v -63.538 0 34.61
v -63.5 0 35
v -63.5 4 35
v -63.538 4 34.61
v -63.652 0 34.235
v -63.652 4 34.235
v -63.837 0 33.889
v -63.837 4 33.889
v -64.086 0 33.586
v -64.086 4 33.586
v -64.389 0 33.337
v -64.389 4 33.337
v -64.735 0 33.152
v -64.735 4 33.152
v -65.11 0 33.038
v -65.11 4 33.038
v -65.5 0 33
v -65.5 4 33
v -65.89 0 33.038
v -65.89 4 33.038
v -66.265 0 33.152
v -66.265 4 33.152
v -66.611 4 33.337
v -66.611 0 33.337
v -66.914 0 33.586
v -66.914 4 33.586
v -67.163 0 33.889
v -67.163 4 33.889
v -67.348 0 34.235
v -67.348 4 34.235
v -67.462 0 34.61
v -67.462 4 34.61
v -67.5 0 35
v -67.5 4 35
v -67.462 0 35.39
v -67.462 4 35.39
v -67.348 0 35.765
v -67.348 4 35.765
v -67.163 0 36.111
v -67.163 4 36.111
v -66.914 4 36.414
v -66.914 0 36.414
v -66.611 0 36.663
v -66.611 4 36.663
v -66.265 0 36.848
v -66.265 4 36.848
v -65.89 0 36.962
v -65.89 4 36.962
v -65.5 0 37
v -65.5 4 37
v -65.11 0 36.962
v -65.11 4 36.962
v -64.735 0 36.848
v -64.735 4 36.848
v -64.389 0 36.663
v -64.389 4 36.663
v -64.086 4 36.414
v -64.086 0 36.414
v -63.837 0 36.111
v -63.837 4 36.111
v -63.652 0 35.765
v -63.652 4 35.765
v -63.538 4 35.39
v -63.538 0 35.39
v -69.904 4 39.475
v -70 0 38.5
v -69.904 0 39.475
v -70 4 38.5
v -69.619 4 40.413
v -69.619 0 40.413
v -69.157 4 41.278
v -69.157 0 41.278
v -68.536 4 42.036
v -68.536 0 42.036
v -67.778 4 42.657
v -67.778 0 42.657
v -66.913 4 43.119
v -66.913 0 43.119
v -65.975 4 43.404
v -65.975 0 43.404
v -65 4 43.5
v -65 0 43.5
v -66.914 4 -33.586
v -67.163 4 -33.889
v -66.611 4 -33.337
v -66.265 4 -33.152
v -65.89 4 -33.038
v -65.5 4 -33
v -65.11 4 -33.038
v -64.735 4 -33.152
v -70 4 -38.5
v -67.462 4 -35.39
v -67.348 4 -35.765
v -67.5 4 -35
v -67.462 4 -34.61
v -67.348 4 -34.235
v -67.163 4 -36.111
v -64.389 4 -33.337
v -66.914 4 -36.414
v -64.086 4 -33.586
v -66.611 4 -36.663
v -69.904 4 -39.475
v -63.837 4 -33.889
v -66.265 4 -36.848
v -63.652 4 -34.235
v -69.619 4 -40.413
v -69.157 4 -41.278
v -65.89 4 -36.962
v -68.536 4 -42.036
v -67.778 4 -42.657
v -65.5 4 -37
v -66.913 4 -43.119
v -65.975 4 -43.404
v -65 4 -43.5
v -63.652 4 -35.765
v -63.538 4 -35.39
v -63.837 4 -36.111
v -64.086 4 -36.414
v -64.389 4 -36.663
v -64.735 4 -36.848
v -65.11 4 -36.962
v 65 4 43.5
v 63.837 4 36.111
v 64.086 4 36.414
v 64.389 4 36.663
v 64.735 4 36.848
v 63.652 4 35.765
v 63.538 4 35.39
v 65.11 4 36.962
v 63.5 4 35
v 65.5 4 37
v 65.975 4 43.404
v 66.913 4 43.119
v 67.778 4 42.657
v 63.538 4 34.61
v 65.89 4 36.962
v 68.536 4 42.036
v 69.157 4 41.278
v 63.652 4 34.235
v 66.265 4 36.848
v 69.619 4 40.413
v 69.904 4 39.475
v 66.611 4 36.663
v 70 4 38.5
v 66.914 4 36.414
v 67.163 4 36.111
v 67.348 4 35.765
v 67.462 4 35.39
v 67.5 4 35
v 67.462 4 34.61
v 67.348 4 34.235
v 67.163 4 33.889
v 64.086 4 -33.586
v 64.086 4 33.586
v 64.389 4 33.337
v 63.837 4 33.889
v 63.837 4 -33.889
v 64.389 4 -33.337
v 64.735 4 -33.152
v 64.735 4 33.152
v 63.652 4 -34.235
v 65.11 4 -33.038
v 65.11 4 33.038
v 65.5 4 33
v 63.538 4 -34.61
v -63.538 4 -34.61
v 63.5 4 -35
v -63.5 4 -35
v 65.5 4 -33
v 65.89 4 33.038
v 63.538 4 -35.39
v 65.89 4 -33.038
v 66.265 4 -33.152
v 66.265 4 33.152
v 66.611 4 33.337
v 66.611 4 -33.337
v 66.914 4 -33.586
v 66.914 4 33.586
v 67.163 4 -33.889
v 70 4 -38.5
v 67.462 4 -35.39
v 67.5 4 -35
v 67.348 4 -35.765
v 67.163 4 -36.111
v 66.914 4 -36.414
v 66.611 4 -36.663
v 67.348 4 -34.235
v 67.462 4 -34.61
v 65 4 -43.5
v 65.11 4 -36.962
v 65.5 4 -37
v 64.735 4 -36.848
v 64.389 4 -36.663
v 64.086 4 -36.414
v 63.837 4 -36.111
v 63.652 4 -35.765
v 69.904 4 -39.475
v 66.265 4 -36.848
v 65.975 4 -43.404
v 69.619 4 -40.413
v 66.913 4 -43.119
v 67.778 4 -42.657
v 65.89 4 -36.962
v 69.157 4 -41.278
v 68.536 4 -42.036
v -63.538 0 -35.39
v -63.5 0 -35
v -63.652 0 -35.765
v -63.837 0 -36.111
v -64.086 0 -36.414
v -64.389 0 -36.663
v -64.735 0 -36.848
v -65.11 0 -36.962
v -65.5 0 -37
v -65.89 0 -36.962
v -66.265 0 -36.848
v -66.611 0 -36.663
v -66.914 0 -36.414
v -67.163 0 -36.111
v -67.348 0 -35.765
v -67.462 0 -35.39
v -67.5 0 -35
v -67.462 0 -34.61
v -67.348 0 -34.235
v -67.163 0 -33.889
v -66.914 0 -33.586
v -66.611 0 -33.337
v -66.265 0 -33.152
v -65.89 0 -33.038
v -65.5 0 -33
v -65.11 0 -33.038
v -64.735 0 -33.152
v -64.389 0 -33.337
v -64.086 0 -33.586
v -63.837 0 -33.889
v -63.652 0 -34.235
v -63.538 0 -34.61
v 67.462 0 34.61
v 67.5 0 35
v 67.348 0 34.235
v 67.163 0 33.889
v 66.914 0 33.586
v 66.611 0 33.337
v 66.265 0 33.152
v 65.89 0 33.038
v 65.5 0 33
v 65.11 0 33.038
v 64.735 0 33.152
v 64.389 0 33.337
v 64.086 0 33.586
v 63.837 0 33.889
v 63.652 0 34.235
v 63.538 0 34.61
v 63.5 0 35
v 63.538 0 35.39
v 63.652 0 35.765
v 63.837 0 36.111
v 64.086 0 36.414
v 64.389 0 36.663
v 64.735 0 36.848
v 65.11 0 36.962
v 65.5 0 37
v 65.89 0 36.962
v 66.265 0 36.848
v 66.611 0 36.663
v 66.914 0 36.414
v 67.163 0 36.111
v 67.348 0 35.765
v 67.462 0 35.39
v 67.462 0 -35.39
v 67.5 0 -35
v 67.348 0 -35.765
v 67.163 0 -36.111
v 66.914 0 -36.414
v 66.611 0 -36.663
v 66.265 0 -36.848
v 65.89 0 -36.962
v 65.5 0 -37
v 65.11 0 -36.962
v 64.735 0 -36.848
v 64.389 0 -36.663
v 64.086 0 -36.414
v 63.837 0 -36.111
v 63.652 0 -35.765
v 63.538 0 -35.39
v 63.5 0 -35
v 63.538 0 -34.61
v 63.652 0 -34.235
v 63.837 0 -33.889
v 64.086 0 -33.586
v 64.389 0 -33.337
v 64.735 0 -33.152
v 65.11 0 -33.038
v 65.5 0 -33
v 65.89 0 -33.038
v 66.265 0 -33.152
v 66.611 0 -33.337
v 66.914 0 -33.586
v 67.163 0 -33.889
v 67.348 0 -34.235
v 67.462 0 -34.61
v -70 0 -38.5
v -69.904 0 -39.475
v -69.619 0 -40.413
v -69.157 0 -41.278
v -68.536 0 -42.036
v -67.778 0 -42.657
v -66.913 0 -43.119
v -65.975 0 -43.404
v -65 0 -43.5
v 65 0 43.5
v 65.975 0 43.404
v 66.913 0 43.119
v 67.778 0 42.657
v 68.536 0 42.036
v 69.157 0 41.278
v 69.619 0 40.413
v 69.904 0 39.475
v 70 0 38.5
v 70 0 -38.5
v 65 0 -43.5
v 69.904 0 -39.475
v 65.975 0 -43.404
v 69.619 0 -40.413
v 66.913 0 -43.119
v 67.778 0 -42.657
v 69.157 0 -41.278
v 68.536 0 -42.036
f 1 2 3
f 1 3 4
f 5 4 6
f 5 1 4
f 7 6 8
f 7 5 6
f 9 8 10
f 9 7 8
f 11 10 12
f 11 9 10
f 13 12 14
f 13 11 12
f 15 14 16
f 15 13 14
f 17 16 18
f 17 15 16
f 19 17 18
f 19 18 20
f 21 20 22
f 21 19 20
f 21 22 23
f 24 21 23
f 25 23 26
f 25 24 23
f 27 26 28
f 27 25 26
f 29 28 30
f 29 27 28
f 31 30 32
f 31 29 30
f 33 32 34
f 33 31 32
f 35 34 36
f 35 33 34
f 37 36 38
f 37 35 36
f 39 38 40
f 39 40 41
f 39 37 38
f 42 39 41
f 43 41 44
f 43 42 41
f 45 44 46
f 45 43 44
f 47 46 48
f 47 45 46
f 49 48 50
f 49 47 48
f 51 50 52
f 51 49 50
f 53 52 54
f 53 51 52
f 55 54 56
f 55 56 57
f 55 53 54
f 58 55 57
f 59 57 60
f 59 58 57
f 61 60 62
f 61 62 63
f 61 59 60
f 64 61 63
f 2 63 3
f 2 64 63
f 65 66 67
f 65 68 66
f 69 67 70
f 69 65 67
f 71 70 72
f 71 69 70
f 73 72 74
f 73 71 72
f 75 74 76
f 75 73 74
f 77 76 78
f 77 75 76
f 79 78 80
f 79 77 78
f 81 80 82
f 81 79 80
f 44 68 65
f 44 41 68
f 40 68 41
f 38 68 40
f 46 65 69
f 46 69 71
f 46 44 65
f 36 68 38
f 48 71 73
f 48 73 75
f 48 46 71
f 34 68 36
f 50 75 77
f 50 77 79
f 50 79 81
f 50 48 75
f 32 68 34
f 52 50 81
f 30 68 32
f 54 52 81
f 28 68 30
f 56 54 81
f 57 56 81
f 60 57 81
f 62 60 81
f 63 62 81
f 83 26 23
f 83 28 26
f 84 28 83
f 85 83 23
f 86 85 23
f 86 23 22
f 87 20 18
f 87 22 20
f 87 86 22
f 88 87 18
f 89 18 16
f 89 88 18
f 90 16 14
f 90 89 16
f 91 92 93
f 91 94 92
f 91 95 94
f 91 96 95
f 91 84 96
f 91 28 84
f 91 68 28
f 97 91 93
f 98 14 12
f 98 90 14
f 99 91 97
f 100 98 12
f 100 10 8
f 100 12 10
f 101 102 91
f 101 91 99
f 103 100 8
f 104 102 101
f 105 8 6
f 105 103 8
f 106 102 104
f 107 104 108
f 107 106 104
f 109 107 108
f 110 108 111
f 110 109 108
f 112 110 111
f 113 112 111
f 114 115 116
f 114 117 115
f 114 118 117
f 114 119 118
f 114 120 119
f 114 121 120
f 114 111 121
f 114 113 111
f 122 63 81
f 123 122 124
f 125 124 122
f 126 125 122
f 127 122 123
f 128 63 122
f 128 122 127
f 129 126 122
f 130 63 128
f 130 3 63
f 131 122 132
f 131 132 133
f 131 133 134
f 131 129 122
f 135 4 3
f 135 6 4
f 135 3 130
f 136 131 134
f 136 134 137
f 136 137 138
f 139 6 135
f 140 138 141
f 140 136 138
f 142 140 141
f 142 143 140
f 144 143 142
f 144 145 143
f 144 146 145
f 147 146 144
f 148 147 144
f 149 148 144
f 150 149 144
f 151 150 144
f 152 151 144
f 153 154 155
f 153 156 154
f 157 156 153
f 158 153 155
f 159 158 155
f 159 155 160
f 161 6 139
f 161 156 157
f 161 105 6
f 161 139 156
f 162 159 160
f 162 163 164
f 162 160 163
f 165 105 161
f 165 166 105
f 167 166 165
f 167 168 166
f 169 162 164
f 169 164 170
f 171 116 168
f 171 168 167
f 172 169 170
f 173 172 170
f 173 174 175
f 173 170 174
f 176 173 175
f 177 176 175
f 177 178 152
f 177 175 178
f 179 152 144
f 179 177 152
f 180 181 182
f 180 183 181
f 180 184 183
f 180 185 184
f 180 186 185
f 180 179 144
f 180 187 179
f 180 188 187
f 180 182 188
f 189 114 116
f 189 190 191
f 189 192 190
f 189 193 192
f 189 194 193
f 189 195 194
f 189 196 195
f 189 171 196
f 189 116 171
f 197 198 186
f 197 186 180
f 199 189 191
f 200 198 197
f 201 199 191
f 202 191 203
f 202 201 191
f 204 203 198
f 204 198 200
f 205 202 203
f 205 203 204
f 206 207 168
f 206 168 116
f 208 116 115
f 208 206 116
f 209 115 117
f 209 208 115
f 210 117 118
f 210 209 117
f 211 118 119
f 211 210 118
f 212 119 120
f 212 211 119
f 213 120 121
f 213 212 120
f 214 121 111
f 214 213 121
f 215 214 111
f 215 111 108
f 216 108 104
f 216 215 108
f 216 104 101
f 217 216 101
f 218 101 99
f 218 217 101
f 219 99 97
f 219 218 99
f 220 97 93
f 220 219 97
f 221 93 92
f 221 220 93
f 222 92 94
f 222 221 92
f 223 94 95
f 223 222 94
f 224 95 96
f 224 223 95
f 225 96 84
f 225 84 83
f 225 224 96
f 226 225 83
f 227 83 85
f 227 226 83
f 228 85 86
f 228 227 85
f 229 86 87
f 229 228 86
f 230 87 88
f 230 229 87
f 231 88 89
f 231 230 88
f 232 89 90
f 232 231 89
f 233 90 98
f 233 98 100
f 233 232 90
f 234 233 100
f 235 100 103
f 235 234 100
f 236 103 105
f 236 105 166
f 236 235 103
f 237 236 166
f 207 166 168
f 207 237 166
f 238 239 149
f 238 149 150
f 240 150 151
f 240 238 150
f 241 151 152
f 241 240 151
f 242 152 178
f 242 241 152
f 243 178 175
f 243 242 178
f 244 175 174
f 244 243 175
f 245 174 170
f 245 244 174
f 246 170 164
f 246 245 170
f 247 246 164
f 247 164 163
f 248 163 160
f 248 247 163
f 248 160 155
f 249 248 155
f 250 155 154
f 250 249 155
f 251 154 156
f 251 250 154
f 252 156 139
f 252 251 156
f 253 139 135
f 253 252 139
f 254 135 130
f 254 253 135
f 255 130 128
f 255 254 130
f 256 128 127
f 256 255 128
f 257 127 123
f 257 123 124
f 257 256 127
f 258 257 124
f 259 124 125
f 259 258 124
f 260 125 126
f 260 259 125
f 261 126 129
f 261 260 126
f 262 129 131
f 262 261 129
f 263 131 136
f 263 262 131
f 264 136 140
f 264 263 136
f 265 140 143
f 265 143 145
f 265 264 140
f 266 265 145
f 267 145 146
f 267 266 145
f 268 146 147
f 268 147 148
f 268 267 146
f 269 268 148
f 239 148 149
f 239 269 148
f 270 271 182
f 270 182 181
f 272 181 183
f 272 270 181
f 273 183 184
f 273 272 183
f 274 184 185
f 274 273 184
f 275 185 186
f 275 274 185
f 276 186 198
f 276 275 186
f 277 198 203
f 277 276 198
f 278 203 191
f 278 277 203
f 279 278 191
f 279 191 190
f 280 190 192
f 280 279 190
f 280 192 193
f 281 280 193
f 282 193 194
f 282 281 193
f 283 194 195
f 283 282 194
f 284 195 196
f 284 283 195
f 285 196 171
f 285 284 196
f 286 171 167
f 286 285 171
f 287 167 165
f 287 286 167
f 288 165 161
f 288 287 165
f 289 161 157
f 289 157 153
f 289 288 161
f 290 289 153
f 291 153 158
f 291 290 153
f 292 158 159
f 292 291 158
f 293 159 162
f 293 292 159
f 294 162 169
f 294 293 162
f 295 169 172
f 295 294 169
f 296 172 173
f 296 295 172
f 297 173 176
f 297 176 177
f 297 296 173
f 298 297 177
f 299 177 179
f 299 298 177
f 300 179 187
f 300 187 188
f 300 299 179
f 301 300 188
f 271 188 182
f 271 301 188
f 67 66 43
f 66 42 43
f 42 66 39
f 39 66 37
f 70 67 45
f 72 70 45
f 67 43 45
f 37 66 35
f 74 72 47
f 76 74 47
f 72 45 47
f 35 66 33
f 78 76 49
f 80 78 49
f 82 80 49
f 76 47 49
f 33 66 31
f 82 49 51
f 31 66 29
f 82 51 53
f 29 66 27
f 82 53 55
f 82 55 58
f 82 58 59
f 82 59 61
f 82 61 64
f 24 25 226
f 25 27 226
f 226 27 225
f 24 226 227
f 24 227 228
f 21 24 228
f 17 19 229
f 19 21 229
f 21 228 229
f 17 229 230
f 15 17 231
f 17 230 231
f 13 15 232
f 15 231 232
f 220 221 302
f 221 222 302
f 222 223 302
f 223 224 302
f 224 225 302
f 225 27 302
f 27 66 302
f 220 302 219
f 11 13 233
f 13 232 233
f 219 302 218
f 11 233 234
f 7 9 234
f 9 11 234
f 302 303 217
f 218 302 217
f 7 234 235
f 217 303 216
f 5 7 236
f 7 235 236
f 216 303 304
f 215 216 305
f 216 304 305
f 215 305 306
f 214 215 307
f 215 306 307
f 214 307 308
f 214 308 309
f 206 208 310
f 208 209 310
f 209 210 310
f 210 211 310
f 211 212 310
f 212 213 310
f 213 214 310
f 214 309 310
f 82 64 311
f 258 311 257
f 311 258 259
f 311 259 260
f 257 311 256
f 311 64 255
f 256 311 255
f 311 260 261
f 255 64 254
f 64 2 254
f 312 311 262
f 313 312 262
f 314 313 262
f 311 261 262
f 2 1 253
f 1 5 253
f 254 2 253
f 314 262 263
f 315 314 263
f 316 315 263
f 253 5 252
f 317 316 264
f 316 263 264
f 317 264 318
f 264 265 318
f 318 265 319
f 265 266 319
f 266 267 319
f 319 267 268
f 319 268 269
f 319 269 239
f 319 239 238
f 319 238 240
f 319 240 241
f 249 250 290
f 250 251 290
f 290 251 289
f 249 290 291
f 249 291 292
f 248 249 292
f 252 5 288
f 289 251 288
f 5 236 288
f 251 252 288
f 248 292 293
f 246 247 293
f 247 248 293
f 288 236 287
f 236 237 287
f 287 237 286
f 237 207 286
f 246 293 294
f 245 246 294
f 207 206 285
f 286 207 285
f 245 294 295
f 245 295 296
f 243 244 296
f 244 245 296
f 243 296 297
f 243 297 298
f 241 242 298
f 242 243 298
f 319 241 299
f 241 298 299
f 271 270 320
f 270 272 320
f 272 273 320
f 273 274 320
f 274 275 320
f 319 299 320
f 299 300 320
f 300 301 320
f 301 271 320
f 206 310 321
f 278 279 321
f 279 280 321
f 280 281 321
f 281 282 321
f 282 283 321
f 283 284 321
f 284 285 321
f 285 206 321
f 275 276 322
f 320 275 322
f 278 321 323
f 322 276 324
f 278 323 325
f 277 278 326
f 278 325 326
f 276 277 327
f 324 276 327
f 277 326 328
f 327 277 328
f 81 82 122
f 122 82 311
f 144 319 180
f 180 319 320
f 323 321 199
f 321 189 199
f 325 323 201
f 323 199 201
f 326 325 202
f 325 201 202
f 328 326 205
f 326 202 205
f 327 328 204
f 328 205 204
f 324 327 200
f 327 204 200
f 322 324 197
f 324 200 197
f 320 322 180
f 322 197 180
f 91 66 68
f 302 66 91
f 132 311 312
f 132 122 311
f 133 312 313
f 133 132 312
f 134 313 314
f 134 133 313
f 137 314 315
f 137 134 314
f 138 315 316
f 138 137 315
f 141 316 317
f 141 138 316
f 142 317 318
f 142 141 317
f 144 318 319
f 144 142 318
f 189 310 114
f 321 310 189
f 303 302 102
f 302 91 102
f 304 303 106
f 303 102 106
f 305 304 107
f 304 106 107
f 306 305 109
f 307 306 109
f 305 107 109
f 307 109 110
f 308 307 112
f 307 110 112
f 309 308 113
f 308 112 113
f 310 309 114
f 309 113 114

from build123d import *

# Parameters (mm, degrees)
SKETCH1_W               = 140
SKETCH1_H               = 87
BOSS_EXTRUDE1_DEPTH     = 4
BOSS_EXTRUDE2_START     = -4
BOSS_EXTRUDE2_OUTLINE_R = 2
BOSS_EXTRUDE2_DEPTH     = 4
FILLET1_R               = 5


# Read off the part's stored shape, not the designer's step: Boss-Extrude2
with BuildPart() as part:
    # Sketch1 → Boss-Extrude1 (new body)
    with BuildSketch(Plane(origin=(0, 0, 0), x_dir=(1, 0, 0), z_dir=(0, 1, 0))):
        Rectangle(SKETCH1_W, SKETCH1_H)
    extrude(amount=BOSS_EXTRUDE1_DEPTH)

    # Boss-Extrude2 outline → Boss-Extrude2 (cut)
    with BuildSketch(Plane(origin=(0, 4, 0), x_dir=(1, 0, 0), z_dir=(0, 1, 0)).offset(BOSS_EXTRUDE2_START)):
        with Locations((-65.5, 35)):
            Circle(BOSS_EXTRUDE2_OUTLINE_R)
        with Locations((65.5, -35)):
            Circle(BOSS_EXTRUDE2_OUTLINE_R)
        with Locations((-65.5, -35)):
            Circle(BOSS_EXTRUDE2_OUTLINE_R)
        with Locations((65.5, 35)):
            Circle(BOSS_EXTRUDE2_OUTLINE_R)
    extrude(amount=BOSS_EXTRUDE2_DEPTH, mode=Mode.SUBTRACT)

    # Fillet1
    fillet1_edges = [part.edges().sort_by_distance(p)[0] for p in [
        (70, 2, 43.5),
        (-70, 2, 43.5),
        (-70, 2, -43.5),
        (70, 2, -43.5),
    ]]
    fillet(fillet1_edges, radius=FILLET1_R)


solid = part.part
